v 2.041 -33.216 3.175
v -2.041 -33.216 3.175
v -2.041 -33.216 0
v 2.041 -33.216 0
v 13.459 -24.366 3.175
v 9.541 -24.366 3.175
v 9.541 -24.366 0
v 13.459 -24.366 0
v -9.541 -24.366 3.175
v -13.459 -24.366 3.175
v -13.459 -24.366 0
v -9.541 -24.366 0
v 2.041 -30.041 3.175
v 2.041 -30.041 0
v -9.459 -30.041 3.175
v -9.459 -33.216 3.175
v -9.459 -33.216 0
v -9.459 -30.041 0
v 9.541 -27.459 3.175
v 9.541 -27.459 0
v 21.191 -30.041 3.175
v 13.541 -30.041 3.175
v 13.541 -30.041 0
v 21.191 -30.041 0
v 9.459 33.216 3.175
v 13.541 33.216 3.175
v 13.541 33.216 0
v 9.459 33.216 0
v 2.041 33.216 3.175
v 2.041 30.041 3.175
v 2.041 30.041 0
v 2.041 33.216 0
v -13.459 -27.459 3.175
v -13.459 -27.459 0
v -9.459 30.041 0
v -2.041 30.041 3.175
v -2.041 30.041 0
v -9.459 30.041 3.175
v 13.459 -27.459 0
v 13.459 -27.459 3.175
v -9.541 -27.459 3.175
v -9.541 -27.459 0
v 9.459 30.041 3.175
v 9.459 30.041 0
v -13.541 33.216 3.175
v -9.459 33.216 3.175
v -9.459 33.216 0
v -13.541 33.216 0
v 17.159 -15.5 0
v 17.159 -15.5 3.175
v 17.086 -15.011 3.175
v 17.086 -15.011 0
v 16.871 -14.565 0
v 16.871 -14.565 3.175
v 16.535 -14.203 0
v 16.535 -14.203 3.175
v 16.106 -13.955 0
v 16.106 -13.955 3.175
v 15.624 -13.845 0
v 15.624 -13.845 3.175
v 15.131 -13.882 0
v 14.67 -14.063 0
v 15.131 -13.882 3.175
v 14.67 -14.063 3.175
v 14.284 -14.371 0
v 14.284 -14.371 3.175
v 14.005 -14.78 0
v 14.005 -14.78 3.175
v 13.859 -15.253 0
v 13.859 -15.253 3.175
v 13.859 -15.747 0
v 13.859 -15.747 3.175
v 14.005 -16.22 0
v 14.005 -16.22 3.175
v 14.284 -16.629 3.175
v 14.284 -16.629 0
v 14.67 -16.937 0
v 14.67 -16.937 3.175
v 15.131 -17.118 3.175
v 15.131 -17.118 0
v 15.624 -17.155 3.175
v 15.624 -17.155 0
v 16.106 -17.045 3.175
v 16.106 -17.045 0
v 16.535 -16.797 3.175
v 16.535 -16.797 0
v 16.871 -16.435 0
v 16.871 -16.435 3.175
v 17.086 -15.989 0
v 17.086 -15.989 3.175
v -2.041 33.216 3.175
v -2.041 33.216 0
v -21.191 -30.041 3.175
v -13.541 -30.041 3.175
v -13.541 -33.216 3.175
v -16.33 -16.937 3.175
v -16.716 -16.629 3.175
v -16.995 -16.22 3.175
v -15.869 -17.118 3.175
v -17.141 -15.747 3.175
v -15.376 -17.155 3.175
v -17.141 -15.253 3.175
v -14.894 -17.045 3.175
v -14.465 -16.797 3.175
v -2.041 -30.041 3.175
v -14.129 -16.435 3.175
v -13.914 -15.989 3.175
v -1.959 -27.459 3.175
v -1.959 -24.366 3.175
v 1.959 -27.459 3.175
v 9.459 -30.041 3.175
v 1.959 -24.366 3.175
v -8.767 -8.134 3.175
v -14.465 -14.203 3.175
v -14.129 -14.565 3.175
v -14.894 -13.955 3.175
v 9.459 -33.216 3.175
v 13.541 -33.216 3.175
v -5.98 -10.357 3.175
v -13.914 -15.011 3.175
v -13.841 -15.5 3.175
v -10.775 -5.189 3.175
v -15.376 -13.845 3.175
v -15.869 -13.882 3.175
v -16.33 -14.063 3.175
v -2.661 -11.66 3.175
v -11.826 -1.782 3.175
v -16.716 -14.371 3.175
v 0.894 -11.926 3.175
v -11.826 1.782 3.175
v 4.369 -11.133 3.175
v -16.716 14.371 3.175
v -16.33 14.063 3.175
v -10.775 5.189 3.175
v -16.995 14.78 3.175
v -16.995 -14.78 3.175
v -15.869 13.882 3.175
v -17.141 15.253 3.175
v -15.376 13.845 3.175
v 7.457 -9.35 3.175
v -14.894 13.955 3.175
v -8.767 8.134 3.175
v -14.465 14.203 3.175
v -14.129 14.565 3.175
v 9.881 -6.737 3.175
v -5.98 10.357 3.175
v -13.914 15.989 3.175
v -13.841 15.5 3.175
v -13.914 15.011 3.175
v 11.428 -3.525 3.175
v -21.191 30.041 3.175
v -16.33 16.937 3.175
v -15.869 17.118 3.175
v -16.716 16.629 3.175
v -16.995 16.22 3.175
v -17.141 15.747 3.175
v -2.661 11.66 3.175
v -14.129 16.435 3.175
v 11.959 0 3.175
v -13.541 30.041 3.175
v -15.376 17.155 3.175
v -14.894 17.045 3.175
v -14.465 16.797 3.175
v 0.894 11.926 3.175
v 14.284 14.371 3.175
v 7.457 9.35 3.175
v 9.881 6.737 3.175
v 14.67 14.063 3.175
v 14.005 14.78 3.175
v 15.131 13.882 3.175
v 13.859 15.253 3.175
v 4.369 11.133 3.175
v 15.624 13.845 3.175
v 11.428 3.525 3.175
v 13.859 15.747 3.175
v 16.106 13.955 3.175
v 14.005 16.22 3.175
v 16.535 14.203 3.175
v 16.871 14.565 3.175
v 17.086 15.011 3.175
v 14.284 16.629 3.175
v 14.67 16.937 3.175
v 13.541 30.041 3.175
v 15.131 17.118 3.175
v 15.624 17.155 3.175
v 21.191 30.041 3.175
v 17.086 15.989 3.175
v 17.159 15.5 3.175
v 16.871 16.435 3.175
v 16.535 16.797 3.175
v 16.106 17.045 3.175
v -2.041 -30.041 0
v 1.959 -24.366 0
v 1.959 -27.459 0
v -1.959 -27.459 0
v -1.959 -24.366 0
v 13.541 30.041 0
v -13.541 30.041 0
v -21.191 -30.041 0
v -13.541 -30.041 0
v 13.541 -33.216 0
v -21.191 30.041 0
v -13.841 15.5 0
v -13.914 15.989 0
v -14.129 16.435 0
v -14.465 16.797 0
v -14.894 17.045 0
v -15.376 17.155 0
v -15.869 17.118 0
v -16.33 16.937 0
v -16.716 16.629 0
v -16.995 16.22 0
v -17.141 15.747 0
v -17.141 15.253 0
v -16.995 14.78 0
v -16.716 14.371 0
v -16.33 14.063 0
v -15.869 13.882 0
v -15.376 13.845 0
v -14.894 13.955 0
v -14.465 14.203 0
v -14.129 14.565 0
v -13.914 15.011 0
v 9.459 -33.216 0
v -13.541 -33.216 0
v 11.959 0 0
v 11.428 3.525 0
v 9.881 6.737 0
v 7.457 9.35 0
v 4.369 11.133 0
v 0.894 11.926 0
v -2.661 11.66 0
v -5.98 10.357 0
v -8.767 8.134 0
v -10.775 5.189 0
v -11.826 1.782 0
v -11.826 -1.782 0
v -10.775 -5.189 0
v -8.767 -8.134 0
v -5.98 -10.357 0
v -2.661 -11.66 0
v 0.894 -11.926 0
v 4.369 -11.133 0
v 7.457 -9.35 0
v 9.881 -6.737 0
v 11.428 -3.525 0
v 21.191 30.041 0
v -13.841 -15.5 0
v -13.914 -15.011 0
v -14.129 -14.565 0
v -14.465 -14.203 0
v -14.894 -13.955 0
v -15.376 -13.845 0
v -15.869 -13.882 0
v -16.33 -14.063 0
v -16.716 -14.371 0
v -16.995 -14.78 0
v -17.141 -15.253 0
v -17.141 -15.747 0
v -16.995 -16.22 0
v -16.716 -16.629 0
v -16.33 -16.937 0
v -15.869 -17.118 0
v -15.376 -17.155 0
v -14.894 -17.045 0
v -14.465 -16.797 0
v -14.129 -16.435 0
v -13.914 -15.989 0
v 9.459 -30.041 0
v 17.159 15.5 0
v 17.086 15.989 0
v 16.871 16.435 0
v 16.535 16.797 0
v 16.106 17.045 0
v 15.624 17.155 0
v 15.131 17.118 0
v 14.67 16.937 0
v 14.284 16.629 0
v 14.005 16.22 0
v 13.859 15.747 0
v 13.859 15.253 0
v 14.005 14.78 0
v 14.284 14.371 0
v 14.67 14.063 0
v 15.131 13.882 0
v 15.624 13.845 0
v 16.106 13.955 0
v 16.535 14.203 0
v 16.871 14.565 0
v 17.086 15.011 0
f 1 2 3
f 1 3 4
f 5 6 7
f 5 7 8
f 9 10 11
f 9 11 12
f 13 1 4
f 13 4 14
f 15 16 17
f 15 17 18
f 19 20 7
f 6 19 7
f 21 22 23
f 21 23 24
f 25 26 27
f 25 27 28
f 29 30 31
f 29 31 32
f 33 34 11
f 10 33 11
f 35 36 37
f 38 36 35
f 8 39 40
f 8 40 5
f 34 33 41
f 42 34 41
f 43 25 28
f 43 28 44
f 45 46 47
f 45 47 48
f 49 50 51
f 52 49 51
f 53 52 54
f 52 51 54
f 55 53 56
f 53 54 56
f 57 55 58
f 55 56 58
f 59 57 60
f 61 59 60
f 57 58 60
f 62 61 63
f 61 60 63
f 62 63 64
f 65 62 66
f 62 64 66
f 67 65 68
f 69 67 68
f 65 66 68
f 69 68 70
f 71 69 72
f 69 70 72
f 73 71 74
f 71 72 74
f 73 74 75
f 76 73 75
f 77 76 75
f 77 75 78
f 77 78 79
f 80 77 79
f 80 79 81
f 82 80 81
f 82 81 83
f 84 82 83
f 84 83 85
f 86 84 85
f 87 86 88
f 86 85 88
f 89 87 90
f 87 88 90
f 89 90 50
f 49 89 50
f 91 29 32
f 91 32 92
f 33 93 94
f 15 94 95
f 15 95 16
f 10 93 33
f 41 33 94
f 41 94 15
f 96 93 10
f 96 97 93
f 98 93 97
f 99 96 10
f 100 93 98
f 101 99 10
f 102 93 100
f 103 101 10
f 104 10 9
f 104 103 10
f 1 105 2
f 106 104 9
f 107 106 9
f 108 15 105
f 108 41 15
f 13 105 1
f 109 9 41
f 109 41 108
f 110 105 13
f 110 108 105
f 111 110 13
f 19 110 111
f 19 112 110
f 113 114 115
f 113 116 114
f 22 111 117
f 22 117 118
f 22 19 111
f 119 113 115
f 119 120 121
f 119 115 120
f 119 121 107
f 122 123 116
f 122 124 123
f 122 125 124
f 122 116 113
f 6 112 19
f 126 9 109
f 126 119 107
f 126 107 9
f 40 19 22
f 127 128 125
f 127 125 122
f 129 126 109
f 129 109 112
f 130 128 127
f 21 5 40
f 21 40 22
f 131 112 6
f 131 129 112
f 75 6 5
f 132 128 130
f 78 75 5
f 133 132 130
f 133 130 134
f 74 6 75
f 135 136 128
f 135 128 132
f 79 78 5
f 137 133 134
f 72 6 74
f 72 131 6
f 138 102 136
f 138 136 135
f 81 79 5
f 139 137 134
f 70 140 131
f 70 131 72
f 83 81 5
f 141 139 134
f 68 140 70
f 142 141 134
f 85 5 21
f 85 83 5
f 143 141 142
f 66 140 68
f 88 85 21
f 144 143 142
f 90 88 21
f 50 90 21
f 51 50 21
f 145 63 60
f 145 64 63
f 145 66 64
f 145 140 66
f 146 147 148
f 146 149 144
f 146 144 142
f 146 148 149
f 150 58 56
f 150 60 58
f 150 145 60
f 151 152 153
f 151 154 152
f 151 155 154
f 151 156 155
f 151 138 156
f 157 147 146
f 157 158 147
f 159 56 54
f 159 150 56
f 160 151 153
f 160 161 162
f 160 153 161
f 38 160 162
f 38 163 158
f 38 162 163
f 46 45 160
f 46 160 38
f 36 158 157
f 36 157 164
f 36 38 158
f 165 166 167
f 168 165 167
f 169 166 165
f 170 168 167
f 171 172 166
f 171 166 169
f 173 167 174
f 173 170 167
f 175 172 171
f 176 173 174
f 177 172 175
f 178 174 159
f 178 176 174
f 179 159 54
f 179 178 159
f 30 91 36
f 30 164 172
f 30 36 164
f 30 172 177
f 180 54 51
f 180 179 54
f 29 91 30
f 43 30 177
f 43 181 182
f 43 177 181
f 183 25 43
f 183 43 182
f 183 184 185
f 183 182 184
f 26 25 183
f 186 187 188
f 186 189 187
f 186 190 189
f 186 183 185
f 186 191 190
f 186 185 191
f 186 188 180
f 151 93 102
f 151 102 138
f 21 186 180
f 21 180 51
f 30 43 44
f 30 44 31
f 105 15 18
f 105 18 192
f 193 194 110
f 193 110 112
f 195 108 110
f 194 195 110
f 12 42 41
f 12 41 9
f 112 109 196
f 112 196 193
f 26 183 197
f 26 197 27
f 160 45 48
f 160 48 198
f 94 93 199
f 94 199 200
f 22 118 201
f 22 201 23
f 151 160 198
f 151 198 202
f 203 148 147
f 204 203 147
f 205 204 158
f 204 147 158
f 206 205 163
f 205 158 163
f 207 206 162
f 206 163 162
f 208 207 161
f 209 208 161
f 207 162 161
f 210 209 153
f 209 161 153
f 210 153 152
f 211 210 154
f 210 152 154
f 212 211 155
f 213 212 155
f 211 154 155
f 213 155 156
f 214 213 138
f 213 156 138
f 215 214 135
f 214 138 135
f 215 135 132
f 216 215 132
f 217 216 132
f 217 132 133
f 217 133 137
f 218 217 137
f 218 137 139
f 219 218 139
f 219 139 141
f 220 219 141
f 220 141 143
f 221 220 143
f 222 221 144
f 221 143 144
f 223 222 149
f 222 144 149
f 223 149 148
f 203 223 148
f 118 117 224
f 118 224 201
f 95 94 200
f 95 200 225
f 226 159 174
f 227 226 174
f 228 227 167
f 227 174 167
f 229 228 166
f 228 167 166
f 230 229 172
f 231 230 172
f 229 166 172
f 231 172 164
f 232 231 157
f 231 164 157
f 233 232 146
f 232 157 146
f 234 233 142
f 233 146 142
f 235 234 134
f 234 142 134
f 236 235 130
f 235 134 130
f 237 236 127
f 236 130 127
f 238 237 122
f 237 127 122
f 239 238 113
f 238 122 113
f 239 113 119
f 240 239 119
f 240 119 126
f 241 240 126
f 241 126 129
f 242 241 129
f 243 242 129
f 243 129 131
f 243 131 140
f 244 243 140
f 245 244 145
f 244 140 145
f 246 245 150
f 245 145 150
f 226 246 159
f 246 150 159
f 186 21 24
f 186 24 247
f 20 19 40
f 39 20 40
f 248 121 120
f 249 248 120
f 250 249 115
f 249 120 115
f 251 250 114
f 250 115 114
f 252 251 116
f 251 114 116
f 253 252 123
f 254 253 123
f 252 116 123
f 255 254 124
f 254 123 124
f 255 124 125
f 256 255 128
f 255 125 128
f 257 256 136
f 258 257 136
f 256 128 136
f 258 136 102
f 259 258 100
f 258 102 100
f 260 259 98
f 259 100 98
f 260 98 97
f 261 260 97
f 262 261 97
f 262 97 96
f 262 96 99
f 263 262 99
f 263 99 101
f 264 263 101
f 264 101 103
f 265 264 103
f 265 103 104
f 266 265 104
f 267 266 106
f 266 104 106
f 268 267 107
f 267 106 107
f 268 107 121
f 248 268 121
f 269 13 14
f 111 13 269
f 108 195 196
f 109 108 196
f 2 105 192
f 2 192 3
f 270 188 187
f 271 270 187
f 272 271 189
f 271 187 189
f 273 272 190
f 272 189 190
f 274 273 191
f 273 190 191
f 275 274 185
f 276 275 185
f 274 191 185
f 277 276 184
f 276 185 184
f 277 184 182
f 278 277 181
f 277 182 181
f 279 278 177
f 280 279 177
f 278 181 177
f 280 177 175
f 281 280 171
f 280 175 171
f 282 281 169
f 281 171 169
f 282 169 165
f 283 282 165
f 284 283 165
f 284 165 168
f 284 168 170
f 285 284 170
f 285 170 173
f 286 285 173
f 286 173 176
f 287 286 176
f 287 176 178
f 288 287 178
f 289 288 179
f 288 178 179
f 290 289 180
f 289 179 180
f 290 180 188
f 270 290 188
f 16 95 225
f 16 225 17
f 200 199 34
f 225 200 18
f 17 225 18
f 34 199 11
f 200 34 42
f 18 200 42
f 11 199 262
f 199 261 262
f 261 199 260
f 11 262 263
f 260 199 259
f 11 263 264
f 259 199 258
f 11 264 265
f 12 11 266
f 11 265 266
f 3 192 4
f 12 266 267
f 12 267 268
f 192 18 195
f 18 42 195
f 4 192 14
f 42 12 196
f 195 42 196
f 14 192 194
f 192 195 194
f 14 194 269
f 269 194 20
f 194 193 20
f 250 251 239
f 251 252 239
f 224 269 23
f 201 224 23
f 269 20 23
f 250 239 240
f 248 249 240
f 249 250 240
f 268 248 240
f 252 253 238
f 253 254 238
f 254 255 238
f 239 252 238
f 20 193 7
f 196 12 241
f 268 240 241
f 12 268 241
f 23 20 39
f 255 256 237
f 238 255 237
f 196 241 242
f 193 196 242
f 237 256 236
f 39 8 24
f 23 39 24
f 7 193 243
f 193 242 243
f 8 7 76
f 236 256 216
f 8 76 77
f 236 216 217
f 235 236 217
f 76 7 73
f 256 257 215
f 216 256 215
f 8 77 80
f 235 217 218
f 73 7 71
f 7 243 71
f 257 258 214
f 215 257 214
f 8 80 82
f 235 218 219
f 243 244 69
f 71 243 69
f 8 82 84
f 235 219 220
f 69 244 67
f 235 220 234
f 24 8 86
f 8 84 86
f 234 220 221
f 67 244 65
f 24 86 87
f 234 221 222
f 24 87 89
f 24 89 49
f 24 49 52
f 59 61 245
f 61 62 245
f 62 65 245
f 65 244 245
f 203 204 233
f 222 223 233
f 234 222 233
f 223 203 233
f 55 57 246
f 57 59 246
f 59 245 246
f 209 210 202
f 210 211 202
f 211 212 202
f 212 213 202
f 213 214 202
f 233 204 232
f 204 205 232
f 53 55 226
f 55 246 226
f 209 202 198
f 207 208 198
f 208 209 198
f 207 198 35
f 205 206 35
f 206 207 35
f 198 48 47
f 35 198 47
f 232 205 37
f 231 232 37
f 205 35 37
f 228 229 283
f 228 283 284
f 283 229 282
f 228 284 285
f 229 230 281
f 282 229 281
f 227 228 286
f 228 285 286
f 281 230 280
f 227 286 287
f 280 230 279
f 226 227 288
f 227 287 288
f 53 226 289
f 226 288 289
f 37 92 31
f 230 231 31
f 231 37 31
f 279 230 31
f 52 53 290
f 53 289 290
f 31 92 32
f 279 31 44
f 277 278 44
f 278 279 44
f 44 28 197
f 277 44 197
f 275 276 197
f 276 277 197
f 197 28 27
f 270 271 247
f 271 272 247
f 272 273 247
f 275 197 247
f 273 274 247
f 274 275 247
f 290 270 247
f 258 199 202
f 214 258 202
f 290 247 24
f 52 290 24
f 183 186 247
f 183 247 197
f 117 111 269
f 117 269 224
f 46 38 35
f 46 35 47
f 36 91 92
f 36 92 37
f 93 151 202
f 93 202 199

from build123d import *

# Parameters (mm, degrees)
SKETCH1_R           = 1.7
SKETCH1_W           = 4
SKETCH1_H           = 3.175
SKETCH1_R_2         = 12
BOSS_EXTRUDE1_DEPTH = 3.175
SKETCH2_R           = 11.95936
SKETCH2_R_2         = 1.65936
SKETCH2_W           = 3.91872
SKETCH2_H           = 3.09372
BOSS_EXTRUDE2_DEPTH = 3.175


with BuildPart() as part:
    # Sketch1 → Boss-Extrude1 (new body)
    with BuildSketch(Plane.XY):
        Polygon((2, -33.175), (2, -30), (9.5, -30), (9.5, -33.175), (13.5, -33.175), (13.5, -30), (21.15, -30), (21.15, 30), (13.5, 30), (13.5, 33.175), (9.5, 33.175), (9.5, 30), (2, 30), (2, 33.175), (-2, 33.175), (-2, 30), (-9.5, 30), (-9.5, 33.175), (-13.5, 33.175), (-13.5, 30), (-21.15, 30), (-21.15, -30), (-13.5, -30), (-13.5, -33.175), (-9.5, -33.175), (-9.5, -30), (-2, -30), (-2, -33.175), align=None)
        with Locations((15.5, 15.5)):
            Circle(SKETCH1_R, mode=Mode.SUBTRACT)
        with Locations((-11.5, -25.9125)):
            Rectangle(SKETCH1_W, SKETCH1_H, mode=Mode.SUBTRACT)
        with Locations((0, -25.9125)):
            Rectangle(SKETCH1_W, SKETCH1_H, mode=Mode.SUBTRACT)
        with Locations((-15.5, -15.5)):
            Circle(SKETCH1_R, mode=Mode.SUBTRACT)
        with Locations((11.5, -25.9125)):
            Rectangle(SKETCH1_W, SKETCH1_H, mode=Mode.SUBTRACT)
        with Locations((15.5, -15.5)):
            Circle(SKETCH1_R, mode=Mode.SUBTRACT)
        with Locations((-15.5, 15.5)):
            Circle(SKETCH1_R, mode=Mode.SUBTRACT)
        Circle(SKETCH1_R_2, mode=Mode.SUBTRACT)
    extrude(amount=BOSS_EXTRUDE1_DEPTH)

    # Sketch2 → Boss-Extrude2 (add)
    with BuildSketch(Plane.XY.offset(3.175)):
        Polygon((-21.19064, 30.04064), (-21.19064, -30.04064), (-13.54064, -30.04064), (-13.54064, -33.21564), (-9.45936, -33.21564), (-9.45936, -30.04064), (-2.04064, -30.04064), (-2.04064, -33.21564), (2.04064, -33.21564), (2.04064, -30.04064), (9.45936, -30.04064), (9.45936, -33.21564), (13.54064, -33.21564), (13.54064, -30.04064), (21.19064, -30.04064), (21.19064, 30.04064), (13.54064, 30.04064), (13.54064, 33.21564), (9.45936, 33.21564), (9.45936, 30.04064), (2.04064, 30.04064), (2.04064, 33.21564), (-2.04064, 33.21564), (-2.04064, 30.04064), (-9.45936, 30.04064), (-9.45936, 33.21564), (-13.54064, 33.21564), (-13.54064, 30.04064), align=None)
        Circle(SKETCH2_R, mode=Mode.SUBTRACT)
        with Locations((-15.5, -15.5)):
            Circle(SKETCH2_R_2, mode=Mode.SUBTRACT)
        with Locations((15.5, -15.5)):
            Circle(SKETCH2_R_2, mode=Mode.SUBTRACT)
        with Locations((15.5, 15.5)):
            Circle(SKETCH2_R_2, mode=Mode.SUBTRACT)
        with Locations((-15.5, 15.5)):
            Circle(SKETCH2_R_2, mode=Mode.SUBTRACT)
        with Locations((11.5, -25.9125)):
            Rectangle(SKETCH2_W, SKETCH2_H, mode=Mode.SUBTRACT)
        with Locations((0, -25.9125)):
            Rectangle(SKETCH2_W, SKETCH2_H, mode=Mode.SUBTRACT)
        with Locations((-11.5, -25.9125)):
            Rectangle(SKETCH2_W, SKETCH2_H, mode=Mode.SUBTRACT)
    extrude(amount=-BOSS_EXTRUDE2_DEPTH)


solid = part.part
